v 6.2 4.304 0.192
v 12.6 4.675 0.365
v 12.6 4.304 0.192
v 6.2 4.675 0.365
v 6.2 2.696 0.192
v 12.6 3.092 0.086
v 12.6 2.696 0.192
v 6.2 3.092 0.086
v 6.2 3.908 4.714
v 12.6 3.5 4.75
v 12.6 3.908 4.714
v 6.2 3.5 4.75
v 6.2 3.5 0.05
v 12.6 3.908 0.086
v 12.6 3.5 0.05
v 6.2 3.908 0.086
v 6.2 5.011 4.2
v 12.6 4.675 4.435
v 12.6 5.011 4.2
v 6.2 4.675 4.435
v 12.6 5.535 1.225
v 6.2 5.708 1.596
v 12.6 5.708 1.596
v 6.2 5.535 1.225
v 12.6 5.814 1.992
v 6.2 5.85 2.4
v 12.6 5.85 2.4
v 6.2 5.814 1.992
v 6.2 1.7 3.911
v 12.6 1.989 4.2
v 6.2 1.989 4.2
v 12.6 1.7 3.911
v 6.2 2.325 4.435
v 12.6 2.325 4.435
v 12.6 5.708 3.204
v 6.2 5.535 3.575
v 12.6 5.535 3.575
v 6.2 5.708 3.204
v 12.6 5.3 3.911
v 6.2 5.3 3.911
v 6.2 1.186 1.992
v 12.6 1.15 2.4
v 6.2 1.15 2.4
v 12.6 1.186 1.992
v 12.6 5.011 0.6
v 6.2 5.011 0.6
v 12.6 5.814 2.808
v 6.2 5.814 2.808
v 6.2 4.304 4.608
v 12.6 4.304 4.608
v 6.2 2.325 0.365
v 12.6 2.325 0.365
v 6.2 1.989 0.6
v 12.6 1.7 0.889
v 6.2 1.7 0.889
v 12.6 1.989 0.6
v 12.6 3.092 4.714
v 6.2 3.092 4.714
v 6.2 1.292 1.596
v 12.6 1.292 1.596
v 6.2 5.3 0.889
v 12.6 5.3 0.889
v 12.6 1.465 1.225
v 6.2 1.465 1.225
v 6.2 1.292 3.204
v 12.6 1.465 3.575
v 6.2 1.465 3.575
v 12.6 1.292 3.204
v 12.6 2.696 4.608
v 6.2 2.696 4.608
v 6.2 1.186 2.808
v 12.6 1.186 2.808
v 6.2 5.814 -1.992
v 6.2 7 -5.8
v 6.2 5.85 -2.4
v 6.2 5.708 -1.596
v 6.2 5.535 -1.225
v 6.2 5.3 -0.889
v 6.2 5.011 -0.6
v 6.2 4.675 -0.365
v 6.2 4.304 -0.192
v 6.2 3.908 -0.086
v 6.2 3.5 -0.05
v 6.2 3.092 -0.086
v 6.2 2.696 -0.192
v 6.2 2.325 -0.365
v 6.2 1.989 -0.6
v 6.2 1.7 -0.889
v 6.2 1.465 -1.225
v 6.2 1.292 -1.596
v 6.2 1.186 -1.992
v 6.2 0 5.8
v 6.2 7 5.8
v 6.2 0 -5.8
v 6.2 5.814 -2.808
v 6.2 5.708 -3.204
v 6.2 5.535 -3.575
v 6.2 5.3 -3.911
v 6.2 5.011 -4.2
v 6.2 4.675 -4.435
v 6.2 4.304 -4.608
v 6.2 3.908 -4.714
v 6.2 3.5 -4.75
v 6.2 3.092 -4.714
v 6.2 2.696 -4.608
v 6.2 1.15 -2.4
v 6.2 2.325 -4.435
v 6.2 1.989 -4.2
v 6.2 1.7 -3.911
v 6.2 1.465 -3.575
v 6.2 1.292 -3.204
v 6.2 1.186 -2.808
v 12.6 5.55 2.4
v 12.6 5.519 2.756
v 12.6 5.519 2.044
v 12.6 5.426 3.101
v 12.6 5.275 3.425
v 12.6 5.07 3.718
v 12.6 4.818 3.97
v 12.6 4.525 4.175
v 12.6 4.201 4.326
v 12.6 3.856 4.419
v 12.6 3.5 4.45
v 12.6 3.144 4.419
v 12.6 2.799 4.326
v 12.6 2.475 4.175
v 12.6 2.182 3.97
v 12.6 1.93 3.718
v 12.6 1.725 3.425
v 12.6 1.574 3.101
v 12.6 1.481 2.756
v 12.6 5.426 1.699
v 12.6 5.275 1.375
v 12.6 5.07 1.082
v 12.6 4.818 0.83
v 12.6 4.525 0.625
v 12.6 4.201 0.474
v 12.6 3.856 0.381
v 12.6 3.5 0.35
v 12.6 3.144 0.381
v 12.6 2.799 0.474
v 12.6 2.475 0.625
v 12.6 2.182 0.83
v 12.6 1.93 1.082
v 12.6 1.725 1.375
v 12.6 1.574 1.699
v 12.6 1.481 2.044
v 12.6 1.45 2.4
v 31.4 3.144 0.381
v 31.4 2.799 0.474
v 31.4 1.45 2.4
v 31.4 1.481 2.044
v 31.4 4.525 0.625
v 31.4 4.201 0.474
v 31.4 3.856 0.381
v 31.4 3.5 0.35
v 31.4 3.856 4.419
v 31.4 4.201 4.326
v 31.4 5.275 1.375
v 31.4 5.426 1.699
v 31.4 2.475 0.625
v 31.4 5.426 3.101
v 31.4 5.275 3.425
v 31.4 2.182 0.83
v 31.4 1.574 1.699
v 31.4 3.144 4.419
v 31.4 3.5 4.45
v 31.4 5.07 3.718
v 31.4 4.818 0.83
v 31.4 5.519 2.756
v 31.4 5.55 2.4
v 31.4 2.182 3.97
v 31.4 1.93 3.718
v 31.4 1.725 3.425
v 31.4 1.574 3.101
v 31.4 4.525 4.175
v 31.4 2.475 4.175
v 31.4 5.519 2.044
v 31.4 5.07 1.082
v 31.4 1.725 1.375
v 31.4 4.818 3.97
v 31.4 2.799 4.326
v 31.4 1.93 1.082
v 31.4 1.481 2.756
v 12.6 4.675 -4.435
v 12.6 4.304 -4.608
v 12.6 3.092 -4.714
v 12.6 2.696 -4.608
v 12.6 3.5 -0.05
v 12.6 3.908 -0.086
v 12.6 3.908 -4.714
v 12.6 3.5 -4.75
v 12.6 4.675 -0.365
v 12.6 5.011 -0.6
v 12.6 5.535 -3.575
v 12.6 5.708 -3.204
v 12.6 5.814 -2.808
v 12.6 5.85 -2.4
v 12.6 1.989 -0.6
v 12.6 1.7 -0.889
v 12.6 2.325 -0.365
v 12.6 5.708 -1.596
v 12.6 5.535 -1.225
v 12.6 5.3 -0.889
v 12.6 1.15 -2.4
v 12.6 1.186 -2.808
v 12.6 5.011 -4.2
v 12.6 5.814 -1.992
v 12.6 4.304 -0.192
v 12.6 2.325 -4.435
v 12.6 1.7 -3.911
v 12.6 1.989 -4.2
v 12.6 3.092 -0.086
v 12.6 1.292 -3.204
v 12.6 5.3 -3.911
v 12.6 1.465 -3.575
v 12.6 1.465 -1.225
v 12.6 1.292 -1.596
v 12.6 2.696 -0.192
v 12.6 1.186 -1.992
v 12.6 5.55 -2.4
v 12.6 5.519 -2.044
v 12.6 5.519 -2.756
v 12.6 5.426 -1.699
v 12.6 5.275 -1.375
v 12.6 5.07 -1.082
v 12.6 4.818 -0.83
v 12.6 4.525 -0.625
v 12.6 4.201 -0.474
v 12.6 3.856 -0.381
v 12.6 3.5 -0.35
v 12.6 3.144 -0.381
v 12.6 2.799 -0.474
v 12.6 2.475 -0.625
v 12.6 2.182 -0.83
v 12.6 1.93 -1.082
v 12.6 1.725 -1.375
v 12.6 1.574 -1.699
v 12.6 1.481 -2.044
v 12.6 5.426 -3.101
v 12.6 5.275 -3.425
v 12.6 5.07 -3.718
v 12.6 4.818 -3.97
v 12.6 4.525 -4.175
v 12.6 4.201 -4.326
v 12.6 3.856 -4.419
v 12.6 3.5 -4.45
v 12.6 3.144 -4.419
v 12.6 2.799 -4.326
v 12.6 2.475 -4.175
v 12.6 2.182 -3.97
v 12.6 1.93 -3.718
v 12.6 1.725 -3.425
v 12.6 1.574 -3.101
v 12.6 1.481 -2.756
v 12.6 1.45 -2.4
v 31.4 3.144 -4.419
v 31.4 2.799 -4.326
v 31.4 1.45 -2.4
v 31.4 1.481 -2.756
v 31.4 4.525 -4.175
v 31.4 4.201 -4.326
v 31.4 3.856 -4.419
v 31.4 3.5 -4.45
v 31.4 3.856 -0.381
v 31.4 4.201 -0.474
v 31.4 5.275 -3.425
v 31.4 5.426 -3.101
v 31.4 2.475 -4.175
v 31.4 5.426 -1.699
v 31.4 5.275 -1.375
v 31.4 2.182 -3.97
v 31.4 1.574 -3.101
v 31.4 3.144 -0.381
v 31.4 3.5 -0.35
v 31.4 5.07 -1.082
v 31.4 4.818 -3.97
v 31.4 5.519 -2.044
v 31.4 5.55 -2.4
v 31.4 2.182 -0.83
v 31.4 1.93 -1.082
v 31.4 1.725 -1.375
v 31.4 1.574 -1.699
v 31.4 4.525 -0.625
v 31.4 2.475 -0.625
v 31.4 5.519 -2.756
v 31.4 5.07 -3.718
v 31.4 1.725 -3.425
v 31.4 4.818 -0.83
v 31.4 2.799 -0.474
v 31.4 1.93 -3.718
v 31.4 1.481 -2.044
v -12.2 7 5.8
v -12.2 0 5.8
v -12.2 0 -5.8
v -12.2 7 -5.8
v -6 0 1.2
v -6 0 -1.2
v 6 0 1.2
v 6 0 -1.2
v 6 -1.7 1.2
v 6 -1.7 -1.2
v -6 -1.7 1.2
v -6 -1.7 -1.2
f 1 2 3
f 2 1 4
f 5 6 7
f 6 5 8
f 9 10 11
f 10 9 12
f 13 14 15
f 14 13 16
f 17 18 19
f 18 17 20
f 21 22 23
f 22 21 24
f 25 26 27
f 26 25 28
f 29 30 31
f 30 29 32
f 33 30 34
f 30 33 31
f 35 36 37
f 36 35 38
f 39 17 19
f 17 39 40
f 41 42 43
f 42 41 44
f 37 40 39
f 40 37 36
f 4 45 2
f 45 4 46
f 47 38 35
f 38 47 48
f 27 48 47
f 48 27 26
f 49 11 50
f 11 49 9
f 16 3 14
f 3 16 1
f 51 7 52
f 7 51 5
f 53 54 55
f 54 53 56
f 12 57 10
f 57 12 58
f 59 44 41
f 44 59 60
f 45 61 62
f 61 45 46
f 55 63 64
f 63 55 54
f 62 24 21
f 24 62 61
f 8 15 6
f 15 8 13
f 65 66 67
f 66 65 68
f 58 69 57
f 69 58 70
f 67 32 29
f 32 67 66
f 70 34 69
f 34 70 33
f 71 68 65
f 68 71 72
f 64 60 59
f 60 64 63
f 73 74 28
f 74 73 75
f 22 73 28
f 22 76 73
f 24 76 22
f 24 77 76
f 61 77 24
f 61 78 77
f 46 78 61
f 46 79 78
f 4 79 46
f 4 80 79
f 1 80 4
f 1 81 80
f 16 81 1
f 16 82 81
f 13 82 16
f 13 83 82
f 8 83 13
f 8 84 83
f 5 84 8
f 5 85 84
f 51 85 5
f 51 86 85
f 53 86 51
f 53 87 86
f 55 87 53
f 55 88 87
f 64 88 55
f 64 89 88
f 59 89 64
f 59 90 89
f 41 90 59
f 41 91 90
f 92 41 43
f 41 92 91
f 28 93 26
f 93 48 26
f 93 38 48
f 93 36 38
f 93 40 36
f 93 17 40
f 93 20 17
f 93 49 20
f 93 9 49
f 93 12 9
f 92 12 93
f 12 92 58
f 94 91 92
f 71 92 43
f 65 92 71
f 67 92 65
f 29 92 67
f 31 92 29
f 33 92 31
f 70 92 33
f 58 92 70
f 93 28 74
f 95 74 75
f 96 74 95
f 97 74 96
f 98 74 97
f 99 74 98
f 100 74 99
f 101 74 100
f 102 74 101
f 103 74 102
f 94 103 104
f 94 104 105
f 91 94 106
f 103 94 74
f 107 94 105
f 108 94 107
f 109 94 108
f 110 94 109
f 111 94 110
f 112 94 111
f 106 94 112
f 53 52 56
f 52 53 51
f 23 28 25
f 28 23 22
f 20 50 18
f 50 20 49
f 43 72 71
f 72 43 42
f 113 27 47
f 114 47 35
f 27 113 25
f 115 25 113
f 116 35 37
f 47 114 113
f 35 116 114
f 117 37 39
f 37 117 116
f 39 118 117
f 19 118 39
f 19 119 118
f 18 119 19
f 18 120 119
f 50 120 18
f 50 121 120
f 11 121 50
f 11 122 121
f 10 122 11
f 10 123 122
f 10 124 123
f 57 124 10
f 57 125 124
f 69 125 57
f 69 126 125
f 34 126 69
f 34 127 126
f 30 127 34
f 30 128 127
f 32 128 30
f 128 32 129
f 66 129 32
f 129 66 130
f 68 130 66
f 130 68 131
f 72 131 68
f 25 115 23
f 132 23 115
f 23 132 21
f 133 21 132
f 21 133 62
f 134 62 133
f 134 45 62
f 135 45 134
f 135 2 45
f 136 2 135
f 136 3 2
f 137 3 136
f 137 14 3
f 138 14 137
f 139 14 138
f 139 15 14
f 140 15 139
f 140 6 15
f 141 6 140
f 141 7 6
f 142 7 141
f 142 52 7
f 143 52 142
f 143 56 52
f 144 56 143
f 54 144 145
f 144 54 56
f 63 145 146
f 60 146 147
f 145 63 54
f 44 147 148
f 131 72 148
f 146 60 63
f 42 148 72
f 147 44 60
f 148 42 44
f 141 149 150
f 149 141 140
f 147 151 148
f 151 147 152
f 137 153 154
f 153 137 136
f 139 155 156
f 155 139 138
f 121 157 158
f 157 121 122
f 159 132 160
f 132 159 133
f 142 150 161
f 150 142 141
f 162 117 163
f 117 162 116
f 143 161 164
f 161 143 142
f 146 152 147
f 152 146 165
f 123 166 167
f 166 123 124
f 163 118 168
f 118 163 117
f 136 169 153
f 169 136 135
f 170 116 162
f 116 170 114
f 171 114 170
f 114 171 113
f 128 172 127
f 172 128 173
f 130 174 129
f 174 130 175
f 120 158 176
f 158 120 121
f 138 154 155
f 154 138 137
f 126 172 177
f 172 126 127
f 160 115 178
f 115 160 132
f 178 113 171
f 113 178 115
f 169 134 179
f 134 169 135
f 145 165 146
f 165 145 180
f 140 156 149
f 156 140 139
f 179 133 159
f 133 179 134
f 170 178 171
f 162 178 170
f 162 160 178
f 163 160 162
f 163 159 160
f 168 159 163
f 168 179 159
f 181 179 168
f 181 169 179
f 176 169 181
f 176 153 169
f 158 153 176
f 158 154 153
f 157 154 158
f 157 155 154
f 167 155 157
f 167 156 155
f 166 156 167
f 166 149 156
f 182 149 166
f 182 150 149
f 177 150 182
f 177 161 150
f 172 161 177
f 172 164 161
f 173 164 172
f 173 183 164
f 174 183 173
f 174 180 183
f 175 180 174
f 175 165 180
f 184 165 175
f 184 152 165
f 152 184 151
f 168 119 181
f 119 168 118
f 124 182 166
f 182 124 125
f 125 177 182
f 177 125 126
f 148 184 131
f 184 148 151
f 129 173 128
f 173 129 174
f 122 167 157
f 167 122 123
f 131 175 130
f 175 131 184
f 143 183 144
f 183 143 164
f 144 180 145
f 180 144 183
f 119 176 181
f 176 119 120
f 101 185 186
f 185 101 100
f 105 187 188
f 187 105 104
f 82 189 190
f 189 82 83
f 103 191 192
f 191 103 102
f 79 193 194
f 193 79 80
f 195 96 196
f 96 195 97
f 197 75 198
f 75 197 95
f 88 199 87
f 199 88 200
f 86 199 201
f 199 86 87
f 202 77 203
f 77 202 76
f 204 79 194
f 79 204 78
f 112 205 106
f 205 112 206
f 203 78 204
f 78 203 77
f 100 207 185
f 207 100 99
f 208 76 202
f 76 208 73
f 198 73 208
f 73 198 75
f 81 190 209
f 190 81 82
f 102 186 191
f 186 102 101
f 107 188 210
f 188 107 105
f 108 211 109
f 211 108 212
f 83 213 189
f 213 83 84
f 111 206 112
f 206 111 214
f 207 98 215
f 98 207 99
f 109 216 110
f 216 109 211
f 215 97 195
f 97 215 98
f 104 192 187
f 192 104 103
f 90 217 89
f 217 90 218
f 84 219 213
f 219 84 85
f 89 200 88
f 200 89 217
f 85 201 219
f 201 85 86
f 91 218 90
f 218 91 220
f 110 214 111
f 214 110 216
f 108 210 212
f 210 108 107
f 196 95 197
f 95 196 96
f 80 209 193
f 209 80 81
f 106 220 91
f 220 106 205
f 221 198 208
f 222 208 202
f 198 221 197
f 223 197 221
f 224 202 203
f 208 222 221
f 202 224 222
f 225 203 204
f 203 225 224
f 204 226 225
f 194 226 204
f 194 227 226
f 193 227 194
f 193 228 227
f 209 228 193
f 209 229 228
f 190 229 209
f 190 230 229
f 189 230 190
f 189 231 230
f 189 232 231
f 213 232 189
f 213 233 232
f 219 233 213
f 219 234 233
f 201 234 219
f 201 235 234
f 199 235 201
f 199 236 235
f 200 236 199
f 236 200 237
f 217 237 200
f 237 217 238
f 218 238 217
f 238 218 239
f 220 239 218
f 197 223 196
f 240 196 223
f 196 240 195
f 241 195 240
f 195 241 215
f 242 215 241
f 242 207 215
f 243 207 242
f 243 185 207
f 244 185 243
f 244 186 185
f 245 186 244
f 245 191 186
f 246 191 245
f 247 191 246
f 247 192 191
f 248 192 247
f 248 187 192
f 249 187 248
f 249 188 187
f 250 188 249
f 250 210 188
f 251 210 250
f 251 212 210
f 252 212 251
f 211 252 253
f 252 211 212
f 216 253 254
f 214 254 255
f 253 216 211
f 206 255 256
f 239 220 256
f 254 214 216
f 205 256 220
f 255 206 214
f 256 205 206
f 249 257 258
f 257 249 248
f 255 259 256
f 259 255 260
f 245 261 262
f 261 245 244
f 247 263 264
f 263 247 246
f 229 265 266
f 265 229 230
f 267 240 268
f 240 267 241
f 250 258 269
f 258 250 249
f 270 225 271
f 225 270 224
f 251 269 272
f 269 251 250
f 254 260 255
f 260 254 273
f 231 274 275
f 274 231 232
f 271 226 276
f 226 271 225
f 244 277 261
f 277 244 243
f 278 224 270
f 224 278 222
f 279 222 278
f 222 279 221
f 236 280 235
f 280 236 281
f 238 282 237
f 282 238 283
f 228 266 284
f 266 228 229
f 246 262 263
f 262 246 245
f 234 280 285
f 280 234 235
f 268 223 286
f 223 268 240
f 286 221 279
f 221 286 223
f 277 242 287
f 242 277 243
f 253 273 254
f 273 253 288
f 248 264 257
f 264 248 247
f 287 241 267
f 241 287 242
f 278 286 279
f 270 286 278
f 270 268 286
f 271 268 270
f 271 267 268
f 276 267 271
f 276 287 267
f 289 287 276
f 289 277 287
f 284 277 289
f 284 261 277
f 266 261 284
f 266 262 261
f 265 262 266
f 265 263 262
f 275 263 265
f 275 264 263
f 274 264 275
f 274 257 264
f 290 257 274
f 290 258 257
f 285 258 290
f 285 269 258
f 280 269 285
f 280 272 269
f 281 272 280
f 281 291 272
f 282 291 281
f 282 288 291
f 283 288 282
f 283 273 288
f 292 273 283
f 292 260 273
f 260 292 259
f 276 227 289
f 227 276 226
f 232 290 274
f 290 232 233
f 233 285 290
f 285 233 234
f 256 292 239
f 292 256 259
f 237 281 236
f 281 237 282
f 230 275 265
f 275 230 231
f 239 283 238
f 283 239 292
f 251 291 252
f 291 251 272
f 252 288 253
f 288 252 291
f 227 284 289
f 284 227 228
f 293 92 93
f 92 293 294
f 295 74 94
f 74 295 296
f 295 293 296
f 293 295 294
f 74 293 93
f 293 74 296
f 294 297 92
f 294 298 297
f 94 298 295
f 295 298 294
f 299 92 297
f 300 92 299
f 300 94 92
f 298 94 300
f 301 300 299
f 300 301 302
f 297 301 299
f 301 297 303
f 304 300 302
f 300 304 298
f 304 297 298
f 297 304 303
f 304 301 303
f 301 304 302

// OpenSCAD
// file: bezier.scad
// M matrix

BinomialM = [
     [ -1,  3, -3, 1 ],
	 [  3, -6,  3, 0 ],
	 [ -3,  3,  0, 0 ],
	 [  1,  0,  0, 0 ]];
	 
function normalized(v) = v/norm(v);
	 
function makeMM(P) = BinomialM*P*BinomialM;
function valUV(MM, u=0, v=0) = [v*v*v, v*v, v, 1] * MM * [u*u*u, u*u, u, 1];
function tanU(MM, u=0, v=0) = [v*v*v, v*v, v, 1] * MM * [3*u*u, 2*u, 1, 0];
function tanV(MM, u=0, v=0) = [3*v*v, 2*v, 1, 0] * MM * [u*u*u, u*u, u, 1];
function point(MMx, MMy, MMz, u=0, v=0) = [
								valUV(MMx, u, v), 
								valUV(MMy, u, v), 
								valUV(MMz, u, v)];
function normal(MMx, MMy, MMz, u=0, v=0) = 
	let(product=cross([tanU(MMx, u, v), tanU(MMy, u, v), tanU(MMz, u, v)],
		 			  [tanV(MMx, u, v), tanV(MMy, u, v), tanV(MMz, u, v)]))
	normalized(product);

function shellPoints(MMx, MMy, MMz, up=1, down=1) = concat(
	[for (v=[0:$fn]) for (u=[0:$fn]) point(MMx, MMy, MMz, u/$fn, v/$fn)+up*normal(MMx, MMy, MMz, u/$fn, v/$fn)],
	[for (v=[0:$fn]) for (u=[0:$fn]) point(MMx, MMy, MMz, u/$fn, v/$fn)-down*normal(MMx, MMy, MMz, u/$fn, v/$fn)]);

function shellFaces() = let(f1=($fn+1), N2=f1*f1) concat(
	[for (b=[0:$fn-1]) for (a=[0:$fn-1]) [ a+f1*b, a+f1*(b+1), a+1+f1*b ]], 
	[for (b=[0:$fn-1]) for (a=[0:$fn-1]) [ a+1+f1*b, a+f1*(b+1), a+1+f1*(b+1) ]],
	[for (b=[0:$fn-1]) for (a=[0:$fn-1]) [ a+f1*b+N2, a+1+f1*b+N2, a+f1*(b+1)+N2 ]], 
	[for (b=[0:$fn-1]) for (a=[0:$fn-1]) [ a+1+f1*b+N2, a+1+f1*(b+1)+N2, a+f1*(b+1)+N2 ]], 
	[for (a=[0:$fn-1]) [ a, a+1, a+N2 ]], 
	[for (a=[0:$fn-1]) [ a+1, a+1+N2, a+N2 ]], 
	[for (a=[0:$fn-1]) [ a+f1*$fn, a+f1*$fn+N2, a+1+f1*$fn ]], 
	[for (a=[0:$fn-1]) [ a+1+f1*$fn, a+f1*$fn+N2, a+1+f1*$fn+N2 ]], 
	[for (a=[0:$fn-1]) [ f1*a, f1*a+N2, f1*(a+1) ]], 
	[for (a=[0:$fn-1]) [ f1*(a+1), f1*a+N2, f1*(a+1)+N2 ]], 
	[for (a=[0:$fn-1]) [ $fn+f1*a, $fn+f1*(a+1), $fn+f1*a+N2 ]], 
	[for (a=[0:$fn-1]) [ $fn+f1*(a+1), $fn+f1*(a+1)+N2, $fn+f1*a+N2 ]]);


module BezierShell(Px, Py, Pz, up=1, down=1, $fn=20)
{
	Mx=makeMM(Px);
	My=makeMM(Py);
	Mz=makeMM(Pz);
	
	polyhedron(
		shellPoints(Mx, My, Mz, up, down), 
		shellFaces(Mx, My, Mz), 
		convexity=10);
};

module PositionOnShell(uvPos, Px, Py, Pz)
{
	Mx=makeMM(Px);
	My=makeMM(Py);
	Mz=makeMM(Pz);
	
	for (i=[0:len(uvPos)-1])
	{
		p = point(Mx, My, Mz, uvPos[i][0], uvPos[i][1]);
		u = normalized([
			tanU(Mx, uvPos[i][0], uvPos[i][1]), 
			tanU(My, uvPos[i][0], uvPos[i][1]), 
			tanU(Mz, uvPos[i][0], uvPos[i][1])]);
		w = normal(Mx, My, Mz, uvPos[i][0], uvPos[i][1]);
		v = cross(w, u);
		mat = [
			[u[0], v[0], w[0], p[0]],
			[u[1], v[1], w[1], p[1]],
			[u[2], v[2], w[2], p[2]],
			[   0,    0,    0,    1]];
		multmatrix(mat) children(0);
	}
}

// --------------



module mov(x=0, y=0, z=0)
{
    translate([x, y, z])
    children();
}

module rot(x=0, y=0, z=0)
{
    rotate([x, y, z])
    children();
}

X = [ -26.0, -15.0, 16.0, 22.0 ];
Y1 = [ 3.0, 8.0, 16.0, 3.0 ];
Z1 = [-3.0, -0.2, -0.2, -0.2 ];
Y2 = [ 1.0, 10.0, 18.0, 6.0 ];
Z2 = [ -3.0, 17.0, 22.0, 10.0 ];

Px = [[X[0]+4, X[1], X[2], X[3]],
	  [X[0]+2, X[1], X[2], X[3]],
	  [X[0]+2, X[1], X[2], X[3]],
      [X[0]+4, X[1], X[2], X[3]]];	  
Py = [[-Y1[0], -Y1[1], -Y1[2], -Y1[3] ],
	  [-Y2[0], -Y2[1], -Y2[2], -Y2[3] ],
	  [ Y2[0],  Y2[1],  Y2[2],  Y2[3] ],
	  [ Y1[0],  Y1[1],  Y1[2],  Y1[3] ]];
Pz = [Z1, Z2, Z2, Z1];
	  
border = 0.9;
// main file
include <bezier.scad>

module Head()
{
	$fn=36;
	sphere(d=7.4);
	mov(x=1) rot(y=90) cylinder(d=9.1, h=2, center=true);
	difference()
	{
		mov(z=1) rot(y=20) mov(x=9.4) cube(size=[20.8, 12.5, 10.3], center=true);
		mov(x=-9) cube(size=20, center=true);
	}
}


module Laser()
{
	cube(size=[12, 3.4, 2.4], center=true);
	mov(x=-3, y=3.5)
	{
		$fn=36;
		cube(size=[18.4, 7, 11.6], center=true);
		mov(z=2.4)
		{	
			mov(x=9.2) rot(y=90) cylinder(d=4.7, h=6.4);
			mov(x=9.2) rot(y=90) cylinder(d=4.1, h=25.2);
		}
		mov(z=-2.4)
		{	
			mov(x=9.2) rot(y=90) cylinder(d=4.7, h=6.4);
			mov(x=9.2) rot(y=90) cylinder(d=4.1, h=25.2);
		}
	}
}

Laser();
